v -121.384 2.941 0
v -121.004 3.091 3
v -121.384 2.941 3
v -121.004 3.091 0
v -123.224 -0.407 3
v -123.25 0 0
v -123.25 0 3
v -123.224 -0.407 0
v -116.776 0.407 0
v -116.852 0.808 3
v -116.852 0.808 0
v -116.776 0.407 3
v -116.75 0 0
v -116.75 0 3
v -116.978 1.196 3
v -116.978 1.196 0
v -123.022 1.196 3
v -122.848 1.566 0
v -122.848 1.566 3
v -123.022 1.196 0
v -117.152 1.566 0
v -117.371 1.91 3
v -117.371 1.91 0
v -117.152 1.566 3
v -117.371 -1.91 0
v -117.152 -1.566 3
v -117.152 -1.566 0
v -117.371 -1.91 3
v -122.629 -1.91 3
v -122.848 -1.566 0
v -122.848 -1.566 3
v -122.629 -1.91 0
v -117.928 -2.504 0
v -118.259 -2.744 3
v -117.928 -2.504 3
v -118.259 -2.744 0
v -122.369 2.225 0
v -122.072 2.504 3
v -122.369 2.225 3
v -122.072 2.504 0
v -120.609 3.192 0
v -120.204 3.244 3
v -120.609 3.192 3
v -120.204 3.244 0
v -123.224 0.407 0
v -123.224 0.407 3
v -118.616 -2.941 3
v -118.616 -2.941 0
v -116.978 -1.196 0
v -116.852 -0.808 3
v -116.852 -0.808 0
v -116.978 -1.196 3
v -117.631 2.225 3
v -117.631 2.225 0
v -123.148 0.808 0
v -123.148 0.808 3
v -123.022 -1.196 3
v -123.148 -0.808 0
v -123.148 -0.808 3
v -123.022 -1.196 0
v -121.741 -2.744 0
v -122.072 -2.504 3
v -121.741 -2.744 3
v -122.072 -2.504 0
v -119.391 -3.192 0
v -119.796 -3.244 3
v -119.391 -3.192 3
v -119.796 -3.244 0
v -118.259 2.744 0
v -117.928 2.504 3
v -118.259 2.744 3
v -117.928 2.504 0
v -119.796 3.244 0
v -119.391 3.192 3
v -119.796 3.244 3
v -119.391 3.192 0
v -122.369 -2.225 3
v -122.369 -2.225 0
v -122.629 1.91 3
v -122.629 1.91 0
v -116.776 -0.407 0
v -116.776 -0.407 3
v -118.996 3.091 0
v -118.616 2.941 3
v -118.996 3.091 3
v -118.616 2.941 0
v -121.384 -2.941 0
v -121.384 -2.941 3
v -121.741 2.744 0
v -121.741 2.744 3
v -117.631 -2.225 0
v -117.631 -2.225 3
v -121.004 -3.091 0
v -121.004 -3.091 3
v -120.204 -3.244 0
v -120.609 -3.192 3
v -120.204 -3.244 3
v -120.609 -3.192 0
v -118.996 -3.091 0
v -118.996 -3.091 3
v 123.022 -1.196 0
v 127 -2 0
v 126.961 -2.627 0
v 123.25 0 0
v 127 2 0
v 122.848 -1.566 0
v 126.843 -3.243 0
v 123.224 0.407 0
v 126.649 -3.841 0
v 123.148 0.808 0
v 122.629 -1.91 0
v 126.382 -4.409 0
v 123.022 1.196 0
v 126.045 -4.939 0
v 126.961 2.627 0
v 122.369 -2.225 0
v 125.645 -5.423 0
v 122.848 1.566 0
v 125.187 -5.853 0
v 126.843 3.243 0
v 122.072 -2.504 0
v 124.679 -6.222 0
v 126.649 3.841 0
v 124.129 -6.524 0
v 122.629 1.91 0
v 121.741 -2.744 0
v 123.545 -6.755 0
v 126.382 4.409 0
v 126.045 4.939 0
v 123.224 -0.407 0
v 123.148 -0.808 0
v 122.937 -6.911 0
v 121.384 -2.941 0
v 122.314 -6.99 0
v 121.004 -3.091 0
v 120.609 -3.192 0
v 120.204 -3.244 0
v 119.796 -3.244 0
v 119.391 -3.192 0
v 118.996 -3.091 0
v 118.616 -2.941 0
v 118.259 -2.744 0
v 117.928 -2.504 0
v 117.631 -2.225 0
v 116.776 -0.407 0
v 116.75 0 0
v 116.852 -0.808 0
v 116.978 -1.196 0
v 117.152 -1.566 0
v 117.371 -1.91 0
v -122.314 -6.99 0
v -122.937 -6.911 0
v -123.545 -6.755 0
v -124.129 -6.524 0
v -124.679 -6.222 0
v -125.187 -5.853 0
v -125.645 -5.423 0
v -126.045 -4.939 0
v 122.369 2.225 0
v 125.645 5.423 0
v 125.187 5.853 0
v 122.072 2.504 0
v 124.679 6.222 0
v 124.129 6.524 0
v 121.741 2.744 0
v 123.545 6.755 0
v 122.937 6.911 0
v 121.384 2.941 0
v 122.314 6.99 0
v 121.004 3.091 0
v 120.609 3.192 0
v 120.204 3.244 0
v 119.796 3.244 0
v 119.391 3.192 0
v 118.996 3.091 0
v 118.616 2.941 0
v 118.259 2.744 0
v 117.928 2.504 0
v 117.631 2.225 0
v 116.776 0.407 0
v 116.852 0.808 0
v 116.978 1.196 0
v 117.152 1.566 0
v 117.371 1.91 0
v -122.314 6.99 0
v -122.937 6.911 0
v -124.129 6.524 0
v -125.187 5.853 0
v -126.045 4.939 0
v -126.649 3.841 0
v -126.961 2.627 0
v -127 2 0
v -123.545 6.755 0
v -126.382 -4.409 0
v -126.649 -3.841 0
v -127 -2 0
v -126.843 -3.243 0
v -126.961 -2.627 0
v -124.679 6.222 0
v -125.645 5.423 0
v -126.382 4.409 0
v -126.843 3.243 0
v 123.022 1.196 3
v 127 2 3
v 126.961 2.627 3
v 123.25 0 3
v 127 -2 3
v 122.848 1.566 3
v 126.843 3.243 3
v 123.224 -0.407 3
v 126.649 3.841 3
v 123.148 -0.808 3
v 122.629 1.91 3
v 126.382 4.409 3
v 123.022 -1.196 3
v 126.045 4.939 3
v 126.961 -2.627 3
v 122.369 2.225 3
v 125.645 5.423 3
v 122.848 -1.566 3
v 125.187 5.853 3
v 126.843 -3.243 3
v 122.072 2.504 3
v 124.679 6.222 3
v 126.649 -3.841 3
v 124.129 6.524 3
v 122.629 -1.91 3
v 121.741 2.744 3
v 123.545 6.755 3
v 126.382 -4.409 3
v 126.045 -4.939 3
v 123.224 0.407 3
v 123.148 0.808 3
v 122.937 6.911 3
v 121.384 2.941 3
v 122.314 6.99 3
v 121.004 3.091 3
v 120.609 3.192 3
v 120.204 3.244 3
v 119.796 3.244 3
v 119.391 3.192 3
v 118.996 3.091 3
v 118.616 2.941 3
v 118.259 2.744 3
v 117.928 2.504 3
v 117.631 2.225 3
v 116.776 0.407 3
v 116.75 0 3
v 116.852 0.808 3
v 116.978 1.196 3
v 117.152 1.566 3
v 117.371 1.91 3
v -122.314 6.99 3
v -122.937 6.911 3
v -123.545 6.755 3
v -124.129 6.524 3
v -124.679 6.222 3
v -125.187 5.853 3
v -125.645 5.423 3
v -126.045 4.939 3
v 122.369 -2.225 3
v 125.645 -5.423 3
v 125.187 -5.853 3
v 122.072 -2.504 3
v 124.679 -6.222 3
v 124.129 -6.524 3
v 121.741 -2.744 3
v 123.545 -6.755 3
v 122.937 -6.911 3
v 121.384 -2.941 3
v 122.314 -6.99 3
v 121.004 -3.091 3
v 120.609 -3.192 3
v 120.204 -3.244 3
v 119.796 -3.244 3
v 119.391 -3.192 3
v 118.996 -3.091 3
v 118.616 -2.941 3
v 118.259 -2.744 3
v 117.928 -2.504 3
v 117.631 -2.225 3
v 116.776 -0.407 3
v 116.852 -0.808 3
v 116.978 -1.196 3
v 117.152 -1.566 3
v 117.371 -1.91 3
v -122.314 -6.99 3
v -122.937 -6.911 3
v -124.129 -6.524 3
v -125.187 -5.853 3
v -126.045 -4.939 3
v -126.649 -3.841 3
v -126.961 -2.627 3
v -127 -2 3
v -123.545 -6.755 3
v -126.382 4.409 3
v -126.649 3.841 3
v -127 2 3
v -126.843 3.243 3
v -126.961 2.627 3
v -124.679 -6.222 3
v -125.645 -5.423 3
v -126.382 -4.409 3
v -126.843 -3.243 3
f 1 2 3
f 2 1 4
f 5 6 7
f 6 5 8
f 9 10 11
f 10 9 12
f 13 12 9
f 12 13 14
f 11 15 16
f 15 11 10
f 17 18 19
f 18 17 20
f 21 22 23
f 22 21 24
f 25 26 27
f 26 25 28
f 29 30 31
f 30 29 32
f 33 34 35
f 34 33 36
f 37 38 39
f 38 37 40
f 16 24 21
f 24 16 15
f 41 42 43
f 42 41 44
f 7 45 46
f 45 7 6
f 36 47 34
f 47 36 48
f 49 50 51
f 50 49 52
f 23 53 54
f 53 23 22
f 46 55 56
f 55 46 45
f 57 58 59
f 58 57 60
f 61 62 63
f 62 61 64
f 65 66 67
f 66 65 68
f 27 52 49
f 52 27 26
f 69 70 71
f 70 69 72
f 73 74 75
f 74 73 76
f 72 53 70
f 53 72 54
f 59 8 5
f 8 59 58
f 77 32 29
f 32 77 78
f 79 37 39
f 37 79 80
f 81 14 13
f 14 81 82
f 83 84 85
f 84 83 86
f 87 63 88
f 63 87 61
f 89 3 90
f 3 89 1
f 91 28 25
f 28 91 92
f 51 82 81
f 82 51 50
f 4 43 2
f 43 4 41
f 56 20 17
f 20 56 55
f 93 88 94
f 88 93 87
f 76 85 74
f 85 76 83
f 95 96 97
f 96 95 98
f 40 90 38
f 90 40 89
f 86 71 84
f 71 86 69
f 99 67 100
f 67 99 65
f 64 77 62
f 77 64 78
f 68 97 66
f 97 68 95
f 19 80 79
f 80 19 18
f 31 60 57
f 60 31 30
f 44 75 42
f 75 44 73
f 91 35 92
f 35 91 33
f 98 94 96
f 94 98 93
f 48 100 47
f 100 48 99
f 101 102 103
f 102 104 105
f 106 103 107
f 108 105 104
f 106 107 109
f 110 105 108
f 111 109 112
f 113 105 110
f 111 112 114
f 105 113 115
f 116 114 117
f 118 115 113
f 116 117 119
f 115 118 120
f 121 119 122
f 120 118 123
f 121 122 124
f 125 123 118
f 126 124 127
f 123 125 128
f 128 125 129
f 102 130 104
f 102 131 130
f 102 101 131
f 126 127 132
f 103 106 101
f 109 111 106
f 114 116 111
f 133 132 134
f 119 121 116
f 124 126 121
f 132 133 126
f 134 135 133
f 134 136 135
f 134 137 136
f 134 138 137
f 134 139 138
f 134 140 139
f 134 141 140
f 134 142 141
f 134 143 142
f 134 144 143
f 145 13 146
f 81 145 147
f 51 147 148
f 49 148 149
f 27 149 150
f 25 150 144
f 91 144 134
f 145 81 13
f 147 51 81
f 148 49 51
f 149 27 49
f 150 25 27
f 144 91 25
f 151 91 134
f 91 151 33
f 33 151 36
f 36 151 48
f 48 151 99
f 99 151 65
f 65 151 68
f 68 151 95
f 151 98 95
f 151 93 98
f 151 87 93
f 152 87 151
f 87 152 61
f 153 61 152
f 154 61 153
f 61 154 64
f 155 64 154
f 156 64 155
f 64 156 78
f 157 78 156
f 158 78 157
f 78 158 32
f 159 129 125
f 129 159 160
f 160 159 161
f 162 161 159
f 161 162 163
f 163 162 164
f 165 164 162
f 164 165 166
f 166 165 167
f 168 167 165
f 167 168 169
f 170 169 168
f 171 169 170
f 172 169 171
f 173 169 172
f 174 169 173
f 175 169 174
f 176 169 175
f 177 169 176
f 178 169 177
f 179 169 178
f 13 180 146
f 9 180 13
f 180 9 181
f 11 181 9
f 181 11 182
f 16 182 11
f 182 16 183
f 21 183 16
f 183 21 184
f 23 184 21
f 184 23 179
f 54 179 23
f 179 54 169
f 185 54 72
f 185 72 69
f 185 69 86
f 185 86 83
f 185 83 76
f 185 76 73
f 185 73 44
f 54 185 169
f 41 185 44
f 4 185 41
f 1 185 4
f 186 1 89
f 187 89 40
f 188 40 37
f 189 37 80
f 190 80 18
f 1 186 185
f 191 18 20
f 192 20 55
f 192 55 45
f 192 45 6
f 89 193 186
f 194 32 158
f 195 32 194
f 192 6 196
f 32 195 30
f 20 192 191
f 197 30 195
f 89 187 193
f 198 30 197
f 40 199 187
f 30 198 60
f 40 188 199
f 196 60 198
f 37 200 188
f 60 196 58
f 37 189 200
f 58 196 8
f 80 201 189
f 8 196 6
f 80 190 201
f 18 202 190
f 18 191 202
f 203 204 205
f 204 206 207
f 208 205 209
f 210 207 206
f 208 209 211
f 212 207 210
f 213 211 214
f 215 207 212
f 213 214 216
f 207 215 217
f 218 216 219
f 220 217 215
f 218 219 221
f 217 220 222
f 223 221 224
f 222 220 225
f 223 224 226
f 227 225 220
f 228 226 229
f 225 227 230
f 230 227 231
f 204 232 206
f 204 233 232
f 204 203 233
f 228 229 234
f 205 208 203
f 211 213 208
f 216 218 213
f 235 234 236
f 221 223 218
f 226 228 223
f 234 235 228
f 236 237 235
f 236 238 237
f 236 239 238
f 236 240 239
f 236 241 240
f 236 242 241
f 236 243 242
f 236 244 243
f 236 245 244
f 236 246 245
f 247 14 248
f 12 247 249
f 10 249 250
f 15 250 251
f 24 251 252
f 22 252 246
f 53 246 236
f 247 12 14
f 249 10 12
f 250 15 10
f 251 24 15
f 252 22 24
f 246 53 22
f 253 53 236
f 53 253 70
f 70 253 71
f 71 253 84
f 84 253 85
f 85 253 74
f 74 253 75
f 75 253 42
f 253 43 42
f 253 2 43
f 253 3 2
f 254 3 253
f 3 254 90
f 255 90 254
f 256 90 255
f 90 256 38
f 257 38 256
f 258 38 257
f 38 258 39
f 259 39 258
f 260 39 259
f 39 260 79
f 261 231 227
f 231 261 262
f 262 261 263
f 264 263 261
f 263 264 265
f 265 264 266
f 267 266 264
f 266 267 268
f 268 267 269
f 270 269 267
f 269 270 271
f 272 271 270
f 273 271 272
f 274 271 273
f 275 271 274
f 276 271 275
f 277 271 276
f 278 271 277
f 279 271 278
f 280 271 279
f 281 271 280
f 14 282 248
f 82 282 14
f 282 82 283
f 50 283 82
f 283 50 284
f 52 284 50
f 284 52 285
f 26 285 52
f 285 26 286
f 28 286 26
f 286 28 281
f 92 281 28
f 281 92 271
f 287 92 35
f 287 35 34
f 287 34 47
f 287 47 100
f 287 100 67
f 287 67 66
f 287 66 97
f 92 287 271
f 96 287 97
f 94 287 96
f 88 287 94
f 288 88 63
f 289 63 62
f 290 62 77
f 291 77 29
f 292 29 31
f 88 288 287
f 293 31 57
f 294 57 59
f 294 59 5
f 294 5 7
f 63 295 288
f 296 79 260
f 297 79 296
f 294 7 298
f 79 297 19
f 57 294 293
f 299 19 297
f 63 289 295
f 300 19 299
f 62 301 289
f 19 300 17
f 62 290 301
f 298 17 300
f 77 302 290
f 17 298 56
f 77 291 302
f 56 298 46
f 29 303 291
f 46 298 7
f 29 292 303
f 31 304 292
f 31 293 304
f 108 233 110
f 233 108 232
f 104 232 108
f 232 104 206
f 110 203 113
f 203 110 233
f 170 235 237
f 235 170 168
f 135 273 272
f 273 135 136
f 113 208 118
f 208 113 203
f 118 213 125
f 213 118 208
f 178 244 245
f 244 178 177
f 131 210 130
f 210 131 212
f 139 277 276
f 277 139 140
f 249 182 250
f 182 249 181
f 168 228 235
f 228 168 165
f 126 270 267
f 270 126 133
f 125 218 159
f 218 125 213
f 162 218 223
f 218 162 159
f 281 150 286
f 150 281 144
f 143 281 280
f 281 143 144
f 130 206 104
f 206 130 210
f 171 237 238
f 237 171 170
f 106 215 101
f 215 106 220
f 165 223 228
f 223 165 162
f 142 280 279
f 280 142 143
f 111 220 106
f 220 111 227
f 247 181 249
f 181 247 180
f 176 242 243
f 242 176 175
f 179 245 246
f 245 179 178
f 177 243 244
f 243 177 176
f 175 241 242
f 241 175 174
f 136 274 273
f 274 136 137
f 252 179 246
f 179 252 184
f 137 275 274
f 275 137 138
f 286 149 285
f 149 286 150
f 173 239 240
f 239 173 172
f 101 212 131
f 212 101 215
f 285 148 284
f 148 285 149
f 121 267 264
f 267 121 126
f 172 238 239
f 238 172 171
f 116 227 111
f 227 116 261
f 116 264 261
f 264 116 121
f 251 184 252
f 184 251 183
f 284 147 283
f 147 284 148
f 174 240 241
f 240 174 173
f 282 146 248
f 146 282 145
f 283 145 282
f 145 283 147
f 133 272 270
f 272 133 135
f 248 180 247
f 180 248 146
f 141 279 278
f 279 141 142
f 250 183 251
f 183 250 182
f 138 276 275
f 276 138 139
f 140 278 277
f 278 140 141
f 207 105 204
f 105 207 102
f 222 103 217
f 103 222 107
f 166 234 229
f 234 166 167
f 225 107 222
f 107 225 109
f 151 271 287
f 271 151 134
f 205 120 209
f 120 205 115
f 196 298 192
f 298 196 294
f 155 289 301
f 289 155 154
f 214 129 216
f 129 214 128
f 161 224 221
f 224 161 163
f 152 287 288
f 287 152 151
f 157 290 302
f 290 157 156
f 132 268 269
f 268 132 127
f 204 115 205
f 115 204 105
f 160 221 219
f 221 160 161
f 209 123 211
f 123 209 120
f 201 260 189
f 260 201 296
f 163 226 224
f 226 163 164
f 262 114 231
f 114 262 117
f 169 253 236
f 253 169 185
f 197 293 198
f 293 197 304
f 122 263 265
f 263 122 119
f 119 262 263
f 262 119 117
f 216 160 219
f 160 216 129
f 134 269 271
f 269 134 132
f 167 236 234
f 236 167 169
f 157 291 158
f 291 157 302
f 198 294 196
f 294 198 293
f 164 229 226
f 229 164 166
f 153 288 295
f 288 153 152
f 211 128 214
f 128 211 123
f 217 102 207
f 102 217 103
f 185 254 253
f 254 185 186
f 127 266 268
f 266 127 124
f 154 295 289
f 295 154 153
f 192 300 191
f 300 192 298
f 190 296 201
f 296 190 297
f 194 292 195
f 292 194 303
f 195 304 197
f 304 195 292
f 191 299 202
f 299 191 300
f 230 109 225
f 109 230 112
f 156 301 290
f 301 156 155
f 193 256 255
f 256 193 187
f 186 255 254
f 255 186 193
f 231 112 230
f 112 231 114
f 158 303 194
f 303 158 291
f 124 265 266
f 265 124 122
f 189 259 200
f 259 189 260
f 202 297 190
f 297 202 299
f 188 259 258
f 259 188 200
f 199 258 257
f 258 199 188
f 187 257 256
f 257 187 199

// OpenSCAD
$fn = 50;


difference() {
	union() {
		hull() {
			translate(v = [-122.0000000000, 2.0000000000, 0]) {
				cylinder(h = 3, r = 5);
			}
			translate(v = [122.0000000000, 2.0000000000, 0]) {
				cylinder(h = 3, r = 5);
			}
			translate(v = [-122.0000000000, -2.0000000000, 0]) {
				cylinder(h = 3, r = 5);
			}
			translate(v = [122.0000000000, -2.0000000000, 0]) {
				cylinder(h = 3, r = 5);
			}
		}
	}
	union() {
		translate(v = [-120.0000000000, 0.0000000000, 0]) {
			cylinder(h = 3, r = 3.2500000000);
		}
		translate(v = [120.0000000000, 0.0000000000, 0]) {
			cylinder(h = 3, r = 3.2500000000);
		}
		translate(v = [-120.0000000000, 0.0000000000, 0]) {
			cylinder(h = 3, r = 1.8000000000);
		}
		translate(v = [120.0000000000, 0.0000000000, 0]) {
			cylinder(h = 3, r = 1.8000000000);
		}
		translate(v = [-120.0000000000, 0.0000000000, 0]) {
			cylinder(h = 3, r = 1.8000000000);
		}
		translate(v = [120.0000000000, 0.0000000000, 0]) {
			cylinder(h = 3, r = 1.8000000000);
		}
		translate(v = [-120.0000000000, 0.0000000000, 0]) {
			cylinder(h = 3, r = 1.8000000000);
		}
		translate(v = [120.0000000000, 0.0000000000, 0]) {
			cylinder(h = 3, r = 1.8000000000);
		}
	}
}
